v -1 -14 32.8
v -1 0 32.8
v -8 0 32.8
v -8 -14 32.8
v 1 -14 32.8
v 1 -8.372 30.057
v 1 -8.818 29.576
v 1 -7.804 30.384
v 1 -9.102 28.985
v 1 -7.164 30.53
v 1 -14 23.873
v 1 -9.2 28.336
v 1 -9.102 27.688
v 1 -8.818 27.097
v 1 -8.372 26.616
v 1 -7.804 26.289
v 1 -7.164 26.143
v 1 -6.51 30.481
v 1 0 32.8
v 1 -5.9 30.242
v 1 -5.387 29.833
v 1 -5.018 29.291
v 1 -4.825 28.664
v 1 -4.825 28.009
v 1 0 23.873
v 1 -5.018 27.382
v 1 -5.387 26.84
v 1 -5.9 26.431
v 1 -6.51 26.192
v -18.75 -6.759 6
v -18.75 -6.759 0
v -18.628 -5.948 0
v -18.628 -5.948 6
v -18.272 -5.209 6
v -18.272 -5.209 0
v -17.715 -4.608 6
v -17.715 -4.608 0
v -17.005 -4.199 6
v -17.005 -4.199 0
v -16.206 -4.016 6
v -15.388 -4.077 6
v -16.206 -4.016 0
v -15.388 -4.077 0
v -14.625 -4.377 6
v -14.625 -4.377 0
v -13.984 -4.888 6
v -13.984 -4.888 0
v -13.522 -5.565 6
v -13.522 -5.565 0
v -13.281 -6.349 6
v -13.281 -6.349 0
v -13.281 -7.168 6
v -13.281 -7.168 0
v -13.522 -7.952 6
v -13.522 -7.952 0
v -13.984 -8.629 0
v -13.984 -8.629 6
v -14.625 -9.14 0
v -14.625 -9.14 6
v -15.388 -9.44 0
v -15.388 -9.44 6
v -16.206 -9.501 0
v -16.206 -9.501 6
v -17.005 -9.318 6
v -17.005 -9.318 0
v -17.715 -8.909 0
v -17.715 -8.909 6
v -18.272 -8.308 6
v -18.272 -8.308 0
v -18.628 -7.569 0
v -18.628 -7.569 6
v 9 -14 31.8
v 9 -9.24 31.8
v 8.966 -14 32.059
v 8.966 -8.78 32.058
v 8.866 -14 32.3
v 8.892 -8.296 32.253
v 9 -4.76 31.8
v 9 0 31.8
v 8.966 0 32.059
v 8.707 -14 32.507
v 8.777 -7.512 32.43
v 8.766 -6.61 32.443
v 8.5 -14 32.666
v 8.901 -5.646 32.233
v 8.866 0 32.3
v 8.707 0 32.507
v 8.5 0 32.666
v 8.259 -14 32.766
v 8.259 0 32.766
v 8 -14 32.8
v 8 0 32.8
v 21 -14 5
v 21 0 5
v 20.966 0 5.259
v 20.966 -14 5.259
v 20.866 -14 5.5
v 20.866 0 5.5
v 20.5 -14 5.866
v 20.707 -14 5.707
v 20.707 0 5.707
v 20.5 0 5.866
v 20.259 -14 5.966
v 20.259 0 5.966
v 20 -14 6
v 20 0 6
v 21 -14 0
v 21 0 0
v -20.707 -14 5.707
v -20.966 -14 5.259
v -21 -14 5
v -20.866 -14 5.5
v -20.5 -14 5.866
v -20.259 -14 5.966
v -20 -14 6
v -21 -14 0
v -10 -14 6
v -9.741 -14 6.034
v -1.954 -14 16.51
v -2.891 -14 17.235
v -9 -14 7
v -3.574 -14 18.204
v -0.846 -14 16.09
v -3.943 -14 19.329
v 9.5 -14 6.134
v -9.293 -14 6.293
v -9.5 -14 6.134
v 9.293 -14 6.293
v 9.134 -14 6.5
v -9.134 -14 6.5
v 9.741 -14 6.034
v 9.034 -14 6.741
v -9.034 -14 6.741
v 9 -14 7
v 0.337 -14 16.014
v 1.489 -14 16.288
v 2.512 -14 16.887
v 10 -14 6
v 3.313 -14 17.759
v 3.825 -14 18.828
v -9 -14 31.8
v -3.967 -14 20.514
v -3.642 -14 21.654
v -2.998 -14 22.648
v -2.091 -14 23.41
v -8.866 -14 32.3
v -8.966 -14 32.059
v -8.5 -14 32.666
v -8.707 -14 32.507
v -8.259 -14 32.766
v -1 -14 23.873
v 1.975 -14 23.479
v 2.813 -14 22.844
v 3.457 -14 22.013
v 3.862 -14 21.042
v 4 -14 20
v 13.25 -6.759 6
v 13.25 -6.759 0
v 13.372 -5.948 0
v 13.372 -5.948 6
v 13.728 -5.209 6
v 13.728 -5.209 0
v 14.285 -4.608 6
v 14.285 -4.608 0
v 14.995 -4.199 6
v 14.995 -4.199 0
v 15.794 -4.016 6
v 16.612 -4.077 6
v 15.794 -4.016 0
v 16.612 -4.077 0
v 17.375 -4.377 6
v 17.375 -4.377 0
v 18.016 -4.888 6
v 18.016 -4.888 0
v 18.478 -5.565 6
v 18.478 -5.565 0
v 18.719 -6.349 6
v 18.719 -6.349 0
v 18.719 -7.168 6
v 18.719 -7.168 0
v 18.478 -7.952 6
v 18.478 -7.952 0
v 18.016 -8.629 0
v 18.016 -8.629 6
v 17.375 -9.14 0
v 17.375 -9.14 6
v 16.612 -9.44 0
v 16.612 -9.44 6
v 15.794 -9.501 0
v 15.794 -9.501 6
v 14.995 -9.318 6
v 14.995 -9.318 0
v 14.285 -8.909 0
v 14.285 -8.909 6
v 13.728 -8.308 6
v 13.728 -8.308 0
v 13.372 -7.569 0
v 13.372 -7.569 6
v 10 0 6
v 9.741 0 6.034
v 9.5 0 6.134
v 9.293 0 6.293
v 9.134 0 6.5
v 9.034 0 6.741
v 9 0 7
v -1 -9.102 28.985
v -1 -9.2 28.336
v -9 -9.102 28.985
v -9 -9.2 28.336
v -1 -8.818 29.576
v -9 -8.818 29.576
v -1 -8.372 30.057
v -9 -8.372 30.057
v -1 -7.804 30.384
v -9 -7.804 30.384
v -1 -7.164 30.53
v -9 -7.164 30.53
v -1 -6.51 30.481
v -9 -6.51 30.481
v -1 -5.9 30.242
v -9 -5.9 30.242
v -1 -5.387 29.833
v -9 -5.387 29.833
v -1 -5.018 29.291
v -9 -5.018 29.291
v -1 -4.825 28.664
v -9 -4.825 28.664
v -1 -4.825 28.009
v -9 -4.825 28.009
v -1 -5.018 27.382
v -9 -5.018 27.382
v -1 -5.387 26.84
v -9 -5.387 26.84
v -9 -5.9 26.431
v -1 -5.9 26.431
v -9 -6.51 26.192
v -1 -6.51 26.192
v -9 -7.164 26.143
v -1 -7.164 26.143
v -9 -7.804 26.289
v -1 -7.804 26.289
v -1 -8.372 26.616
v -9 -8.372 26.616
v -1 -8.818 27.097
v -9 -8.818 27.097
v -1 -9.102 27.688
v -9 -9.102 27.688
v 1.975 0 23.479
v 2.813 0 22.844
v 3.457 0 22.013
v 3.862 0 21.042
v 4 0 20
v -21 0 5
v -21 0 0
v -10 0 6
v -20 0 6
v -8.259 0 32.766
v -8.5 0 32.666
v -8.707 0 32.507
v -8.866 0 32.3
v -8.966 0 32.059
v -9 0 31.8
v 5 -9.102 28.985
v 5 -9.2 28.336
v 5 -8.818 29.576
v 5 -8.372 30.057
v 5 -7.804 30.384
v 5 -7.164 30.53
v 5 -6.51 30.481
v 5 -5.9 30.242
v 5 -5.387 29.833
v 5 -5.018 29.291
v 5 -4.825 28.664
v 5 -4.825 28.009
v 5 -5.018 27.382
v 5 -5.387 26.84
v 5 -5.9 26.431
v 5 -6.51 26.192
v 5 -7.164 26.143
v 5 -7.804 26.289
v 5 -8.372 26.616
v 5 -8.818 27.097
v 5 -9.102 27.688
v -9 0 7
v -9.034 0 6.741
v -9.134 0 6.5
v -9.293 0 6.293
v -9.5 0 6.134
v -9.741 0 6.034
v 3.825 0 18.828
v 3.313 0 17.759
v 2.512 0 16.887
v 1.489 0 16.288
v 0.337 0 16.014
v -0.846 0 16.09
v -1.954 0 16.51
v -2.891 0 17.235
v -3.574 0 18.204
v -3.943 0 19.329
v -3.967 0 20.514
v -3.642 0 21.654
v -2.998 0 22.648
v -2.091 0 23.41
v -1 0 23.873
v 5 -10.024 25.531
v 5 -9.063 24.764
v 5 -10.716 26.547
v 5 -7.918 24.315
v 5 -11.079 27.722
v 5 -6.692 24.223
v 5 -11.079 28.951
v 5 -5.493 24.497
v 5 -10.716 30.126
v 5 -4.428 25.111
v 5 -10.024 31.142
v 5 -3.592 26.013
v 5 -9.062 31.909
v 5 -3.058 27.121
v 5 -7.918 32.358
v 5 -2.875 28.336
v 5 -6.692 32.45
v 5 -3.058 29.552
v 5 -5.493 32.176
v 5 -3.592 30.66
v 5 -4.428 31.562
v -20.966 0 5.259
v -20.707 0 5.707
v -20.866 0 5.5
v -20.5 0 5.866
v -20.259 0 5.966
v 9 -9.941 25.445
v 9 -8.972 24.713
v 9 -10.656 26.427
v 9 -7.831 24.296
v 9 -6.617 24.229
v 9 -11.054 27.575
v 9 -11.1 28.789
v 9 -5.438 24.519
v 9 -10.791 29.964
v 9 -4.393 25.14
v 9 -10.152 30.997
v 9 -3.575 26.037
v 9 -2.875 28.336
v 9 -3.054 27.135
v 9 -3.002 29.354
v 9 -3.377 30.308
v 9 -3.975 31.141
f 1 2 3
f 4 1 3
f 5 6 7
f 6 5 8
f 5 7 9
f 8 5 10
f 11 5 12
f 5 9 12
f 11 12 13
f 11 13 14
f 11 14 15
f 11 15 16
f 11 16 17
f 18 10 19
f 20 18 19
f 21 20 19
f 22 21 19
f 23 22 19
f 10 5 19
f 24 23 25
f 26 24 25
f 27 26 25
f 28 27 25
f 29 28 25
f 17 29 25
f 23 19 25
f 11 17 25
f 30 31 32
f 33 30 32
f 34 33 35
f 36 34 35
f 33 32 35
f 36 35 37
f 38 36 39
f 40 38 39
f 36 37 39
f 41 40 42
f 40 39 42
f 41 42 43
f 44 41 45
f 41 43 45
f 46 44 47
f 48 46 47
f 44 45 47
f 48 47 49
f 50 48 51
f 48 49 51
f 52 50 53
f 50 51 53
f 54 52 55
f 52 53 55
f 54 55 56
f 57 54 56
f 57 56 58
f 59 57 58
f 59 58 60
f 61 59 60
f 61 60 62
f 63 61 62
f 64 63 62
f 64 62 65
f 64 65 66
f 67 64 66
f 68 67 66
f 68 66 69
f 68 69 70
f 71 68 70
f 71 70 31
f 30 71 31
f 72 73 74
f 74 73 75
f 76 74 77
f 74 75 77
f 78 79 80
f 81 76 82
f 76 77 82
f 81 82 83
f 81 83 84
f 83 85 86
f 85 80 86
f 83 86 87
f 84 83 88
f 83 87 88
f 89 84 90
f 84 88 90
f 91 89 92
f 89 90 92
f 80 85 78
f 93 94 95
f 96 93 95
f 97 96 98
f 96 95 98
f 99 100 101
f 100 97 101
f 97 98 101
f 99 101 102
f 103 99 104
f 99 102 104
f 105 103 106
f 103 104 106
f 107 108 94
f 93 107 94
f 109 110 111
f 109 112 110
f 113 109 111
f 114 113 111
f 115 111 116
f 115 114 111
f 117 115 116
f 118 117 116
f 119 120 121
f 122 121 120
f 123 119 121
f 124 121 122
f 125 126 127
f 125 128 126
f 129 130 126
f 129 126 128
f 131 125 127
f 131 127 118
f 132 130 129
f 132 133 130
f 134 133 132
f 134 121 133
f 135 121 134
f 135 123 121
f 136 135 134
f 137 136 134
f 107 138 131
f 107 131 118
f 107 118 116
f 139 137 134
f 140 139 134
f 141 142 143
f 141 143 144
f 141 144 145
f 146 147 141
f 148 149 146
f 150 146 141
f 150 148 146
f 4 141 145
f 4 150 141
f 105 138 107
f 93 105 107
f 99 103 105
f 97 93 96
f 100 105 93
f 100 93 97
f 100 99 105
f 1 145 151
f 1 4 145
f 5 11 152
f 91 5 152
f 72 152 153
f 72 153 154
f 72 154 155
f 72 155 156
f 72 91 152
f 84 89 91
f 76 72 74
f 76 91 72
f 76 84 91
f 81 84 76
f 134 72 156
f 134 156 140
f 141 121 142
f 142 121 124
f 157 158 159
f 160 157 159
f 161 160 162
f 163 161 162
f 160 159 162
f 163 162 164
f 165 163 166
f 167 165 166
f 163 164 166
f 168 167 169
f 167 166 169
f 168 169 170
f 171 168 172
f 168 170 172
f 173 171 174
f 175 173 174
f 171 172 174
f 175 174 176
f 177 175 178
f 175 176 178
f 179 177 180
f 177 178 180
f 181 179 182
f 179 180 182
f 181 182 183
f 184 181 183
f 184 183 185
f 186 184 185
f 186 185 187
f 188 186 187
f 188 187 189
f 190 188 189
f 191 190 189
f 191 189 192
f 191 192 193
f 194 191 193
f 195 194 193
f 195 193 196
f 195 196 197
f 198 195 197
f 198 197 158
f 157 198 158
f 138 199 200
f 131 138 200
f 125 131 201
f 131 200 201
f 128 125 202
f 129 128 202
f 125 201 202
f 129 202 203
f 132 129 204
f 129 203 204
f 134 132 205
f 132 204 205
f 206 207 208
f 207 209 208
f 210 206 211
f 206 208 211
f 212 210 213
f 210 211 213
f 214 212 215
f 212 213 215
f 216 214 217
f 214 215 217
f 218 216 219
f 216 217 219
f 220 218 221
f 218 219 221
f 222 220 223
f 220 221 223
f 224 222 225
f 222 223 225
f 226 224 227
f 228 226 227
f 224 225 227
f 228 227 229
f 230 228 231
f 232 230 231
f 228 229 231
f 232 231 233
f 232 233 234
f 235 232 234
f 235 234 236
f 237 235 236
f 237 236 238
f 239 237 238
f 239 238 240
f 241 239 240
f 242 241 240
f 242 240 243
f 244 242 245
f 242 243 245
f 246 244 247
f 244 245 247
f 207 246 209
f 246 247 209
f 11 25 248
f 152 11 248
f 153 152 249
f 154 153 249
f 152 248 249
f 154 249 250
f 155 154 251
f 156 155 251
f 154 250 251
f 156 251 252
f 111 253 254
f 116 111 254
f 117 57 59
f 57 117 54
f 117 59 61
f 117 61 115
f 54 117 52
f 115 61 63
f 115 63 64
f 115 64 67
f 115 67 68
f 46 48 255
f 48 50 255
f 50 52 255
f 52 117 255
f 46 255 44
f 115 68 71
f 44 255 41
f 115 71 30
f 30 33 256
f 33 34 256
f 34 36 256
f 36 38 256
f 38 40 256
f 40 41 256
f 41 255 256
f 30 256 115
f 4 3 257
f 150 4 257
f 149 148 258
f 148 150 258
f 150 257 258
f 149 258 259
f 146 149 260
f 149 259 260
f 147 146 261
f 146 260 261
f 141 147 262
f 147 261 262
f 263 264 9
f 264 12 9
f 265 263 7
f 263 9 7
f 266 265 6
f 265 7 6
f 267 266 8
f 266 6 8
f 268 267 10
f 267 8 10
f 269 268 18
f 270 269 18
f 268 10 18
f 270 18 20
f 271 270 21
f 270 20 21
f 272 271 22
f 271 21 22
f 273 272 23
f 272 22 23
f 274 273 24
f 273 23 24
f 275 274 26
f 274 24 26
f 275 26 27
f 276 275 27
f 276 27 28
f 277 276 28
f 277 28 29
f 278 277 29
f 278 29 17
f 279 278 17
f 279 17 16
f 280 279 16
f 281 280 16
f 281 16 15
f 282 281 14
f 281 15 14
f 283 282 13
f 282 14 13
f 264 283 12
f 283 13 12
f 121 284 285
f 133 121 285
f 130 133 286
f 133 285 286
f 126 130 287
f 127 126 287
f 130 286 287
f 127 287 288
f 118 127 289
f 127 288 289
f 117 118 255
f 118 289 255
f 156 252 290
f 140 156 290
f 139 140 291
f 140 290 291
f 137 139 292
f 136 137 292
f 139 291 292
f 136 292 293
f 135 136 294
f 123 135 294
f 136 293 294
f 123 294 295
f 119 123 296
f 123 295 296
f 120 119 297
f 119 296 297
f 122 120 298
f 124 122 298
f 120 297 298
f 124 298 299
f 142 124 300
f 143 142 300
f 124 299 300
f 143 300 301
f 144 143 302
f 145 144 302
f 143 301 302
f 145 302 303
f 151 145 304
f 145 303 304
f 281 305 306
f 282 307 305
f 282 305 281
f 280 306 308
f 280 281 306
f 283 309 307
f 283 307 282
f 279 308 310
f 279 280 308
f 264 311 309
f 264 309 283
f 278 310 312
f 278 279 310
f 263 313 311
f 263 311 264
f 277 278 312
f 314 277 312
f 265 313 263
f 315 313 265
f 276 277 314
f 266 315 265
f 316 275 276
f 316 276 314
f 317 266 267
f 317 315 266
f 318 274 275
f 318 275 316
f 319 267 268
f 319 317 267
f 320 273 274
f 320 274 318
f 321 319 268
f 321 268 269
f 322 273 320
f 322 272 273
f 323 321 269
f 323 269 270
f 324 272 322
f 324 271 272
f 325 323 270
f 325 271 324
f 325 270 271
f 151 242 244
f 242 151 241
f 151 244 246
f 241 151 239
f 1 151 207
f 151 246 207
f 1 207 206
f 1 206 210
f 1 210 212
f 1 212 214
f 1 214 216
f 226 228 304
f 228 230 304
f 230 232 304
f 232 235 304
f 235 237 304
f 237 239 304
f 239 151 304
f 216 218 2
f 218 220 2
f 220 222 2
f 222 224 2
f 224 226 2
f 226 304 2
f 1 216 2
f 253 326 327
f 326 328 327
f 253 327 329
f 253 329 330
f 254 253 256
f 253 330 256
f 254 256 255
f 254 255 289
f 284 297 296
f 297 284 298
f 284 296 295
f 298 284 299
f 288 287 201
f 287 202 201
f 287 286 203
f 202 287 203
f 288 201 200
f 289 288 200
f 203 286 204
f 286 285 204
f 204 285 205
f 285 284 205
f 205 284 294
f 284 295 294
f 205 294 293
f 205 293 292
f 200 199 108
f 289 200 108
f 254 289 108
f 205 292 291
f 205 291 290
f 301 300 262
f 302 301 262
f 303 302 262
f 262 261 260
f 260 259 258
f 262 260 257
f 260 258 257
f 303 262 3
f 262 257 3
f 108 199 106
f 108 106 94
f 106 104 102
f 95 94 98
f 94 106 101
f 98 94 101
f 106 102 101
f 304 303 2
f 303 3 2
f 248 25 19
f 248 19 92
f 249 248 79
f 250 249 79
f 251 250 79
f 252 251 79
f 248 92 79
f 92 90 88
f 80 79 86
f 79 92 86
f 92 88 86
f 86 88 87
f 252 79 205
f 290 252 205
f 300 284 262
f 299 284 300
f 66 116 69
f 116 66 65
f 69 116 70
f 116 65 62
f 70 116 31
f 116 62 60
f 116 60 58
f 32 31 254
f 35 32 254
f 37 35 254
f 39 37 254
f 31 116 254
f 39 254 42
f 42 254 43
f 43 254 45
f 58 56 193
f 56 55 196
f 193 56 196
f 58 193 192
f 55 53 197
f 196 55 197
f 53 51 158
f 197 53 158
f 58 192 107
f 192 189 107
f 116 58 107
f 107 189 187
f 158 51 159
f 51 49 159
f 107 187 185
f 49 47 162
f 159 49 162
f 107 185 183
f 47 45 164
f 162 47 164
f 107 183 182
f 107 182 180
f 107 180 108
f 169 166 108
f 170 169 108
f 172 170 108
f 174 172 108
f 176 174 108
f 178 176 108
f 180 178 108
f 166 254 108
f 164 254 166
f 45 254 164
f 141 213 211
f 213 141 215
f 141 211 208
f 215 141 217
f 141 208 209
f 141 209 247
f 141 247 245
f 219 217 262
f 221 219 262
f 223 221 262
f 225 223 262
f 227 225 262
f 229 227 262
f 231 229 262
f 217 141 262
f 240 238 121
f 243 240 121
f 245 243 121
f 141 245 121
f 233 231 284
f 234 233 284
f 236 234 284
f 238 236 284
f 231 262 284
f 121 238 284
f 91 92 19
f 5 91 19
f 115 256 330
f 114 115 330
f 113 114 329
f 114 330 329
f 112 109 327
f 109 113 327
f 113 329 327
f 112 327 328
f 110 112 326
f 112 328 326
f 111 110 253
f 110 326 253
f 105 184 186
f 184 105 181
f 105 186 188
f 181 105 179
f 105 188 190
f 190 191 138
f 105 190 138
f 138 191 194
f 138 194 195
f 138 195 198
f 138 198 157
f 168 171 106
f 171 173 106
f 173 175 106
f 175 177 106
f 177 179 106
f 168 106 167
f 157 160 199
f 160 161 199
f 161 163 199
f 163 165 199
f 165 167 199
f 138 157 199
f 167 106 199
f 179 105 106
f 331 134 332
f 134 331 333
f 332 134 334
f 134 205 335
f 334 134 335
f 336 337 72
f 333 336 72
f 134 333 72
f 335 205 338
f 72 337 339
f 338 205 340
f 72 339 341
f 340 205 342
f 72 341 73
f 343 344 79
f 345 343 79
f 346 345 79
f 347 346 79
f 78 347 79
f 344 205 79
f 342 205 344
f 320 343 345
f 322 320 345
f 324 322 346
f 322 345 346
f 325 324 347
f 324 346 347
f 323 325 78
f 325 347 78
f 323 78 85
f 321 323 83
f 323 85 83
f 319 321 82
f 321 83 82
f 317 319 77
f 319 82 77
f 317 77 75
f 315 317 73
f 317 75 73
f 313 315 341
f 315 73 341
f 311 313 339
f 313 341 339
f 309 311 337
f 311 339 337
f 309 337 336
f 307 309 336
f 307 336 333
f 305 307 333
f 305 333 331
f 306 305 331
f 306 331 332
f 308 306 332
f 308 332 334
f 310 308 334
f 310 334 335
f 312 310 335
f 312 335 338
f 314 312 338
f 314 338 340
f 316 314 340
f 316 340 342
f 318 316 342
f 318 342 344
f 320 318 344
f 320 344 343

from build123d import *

# Parameters (mm, degrees)
F1_DEPTH       = 14
F3_D           = 4.4
F3_CBORE_D     = 8.25
F3_CBORE_DEPTH = 4
F4_T1_DEPTH    = 14
F4_T3_DEPTH    = 19
F6_D           = 5.5


# Not quite as in the source:
# - a fillet or chamfer that OpenCascade refuses, or shapes differently, is made with other operations: its cross-section is extruded or revolved along the edge and cut away or added


with BuildPart() as f1:
    # F0 (on Front) → F1 (new body)
    with BuildSketch(Plane.XZ):
        with BuildLine():
            Line((-21, 6), (-21, 0))
            Line((-21, 0), (21, 0))
            Line((21, 0), (21, 6))
            Line((21, 6), (9, 6))
            Line((9, 6), (9, 32.8))
            Line((9, 32.8), (1, 32.8))
            Line((1, 32.8), (1, 23.8729833462))
            ThreePointArc((1, 23.8729833462), (3.1622776602, 22.4494897428), (4, 20))
            ThreePointArc((4, 20), (-2.4494897428, 16.8377223398), (-1, 23.8729833462))
            Line((-1, 23.8729833462), (-1, 32.8))
            Line((-1, 32.8), (-9, 32.8))
            Line((-9, 32.8), (-9, 6))
            Line((-9, 6), (-21, 6))
        make_face()
    extrude(amount=F1_DEPTH)

    # F3 (through all)
    with Locations(Plane.YZ.offset(9)):
        with Locations((-7, 28.3364916731)):
            CounterBoreHole(F3_D / 2, F3_CBORE_D / 2, F3_CBORE_DEPTH)

    # F4: fillet of radius 1 on 6 edges, made by hand

    # F4_s2 → F4_t1 (join)
    with BuildSketch(Plane.XZ):
        with BuildLine():
            ThreePointArc((10, 6), (9.2928932188, 6.2928932188), (9, 7))
            Line((9, 7), (9, 6))
            Line((9, 6), (10, 6))
        make_face()
        with BuildLine():
            ThreePointArc((-9, 7), (-9.2928932188, 6.2928932188), (-10, 6))
            Line((-10, 6), (-9, 6))
            Line((-9, 6), (-9, 7))
        make_face()
    extrude(amount=F4_T1_DEPTH)

    # F4_s4 → F4_t3 (cut)
    with BuildSketch(Plane.XZ.offset(-2.5)):
        with BuildLine():
            ThreePointArc((-20, 6), (-20.7071067812, 5.7071067812), (-21, 5))
            Line((-21, 5), (-21, 6))
            Line((-21, 6), (-20, 6))
        make_face()
        with BuildLine():
            ThreePointArc((21, 5), (20.7071067812, 5.7071067812), (20, 6))
            Line((20, 6), (21, 6))
            Line((21, 6), (21, 5))
        make_face()
        with BuildLine():
            ThreePointArc((-8, 32.8), (-8.7071067812, 32.5071067812), (-9, 31.8))
            Line((-9, 31.8), (-9, 32.8))
            Line((-9, 32.8), (-8, 32.8))
        make_face()
        with BuildLine():
            ThreePointArc((9, 31.8), (8.7071067812, 32.5071067812), (8, 32.8))
            Line((8, 32.8), (9, 32.8))
            Line((9, 32.8), (9, 31.8))
        make_face()
    extrude(amount=F4_T3_DEPTH, mode=Mode.SUBTRACT)

    # F6 (through all)
    with Locations(Plane.XY.offset(6)):
        with Locations((-16, -6.7585341167), (16, -6.7585341167)):
            Hole(F6_D / 2)


solid = f1.part
